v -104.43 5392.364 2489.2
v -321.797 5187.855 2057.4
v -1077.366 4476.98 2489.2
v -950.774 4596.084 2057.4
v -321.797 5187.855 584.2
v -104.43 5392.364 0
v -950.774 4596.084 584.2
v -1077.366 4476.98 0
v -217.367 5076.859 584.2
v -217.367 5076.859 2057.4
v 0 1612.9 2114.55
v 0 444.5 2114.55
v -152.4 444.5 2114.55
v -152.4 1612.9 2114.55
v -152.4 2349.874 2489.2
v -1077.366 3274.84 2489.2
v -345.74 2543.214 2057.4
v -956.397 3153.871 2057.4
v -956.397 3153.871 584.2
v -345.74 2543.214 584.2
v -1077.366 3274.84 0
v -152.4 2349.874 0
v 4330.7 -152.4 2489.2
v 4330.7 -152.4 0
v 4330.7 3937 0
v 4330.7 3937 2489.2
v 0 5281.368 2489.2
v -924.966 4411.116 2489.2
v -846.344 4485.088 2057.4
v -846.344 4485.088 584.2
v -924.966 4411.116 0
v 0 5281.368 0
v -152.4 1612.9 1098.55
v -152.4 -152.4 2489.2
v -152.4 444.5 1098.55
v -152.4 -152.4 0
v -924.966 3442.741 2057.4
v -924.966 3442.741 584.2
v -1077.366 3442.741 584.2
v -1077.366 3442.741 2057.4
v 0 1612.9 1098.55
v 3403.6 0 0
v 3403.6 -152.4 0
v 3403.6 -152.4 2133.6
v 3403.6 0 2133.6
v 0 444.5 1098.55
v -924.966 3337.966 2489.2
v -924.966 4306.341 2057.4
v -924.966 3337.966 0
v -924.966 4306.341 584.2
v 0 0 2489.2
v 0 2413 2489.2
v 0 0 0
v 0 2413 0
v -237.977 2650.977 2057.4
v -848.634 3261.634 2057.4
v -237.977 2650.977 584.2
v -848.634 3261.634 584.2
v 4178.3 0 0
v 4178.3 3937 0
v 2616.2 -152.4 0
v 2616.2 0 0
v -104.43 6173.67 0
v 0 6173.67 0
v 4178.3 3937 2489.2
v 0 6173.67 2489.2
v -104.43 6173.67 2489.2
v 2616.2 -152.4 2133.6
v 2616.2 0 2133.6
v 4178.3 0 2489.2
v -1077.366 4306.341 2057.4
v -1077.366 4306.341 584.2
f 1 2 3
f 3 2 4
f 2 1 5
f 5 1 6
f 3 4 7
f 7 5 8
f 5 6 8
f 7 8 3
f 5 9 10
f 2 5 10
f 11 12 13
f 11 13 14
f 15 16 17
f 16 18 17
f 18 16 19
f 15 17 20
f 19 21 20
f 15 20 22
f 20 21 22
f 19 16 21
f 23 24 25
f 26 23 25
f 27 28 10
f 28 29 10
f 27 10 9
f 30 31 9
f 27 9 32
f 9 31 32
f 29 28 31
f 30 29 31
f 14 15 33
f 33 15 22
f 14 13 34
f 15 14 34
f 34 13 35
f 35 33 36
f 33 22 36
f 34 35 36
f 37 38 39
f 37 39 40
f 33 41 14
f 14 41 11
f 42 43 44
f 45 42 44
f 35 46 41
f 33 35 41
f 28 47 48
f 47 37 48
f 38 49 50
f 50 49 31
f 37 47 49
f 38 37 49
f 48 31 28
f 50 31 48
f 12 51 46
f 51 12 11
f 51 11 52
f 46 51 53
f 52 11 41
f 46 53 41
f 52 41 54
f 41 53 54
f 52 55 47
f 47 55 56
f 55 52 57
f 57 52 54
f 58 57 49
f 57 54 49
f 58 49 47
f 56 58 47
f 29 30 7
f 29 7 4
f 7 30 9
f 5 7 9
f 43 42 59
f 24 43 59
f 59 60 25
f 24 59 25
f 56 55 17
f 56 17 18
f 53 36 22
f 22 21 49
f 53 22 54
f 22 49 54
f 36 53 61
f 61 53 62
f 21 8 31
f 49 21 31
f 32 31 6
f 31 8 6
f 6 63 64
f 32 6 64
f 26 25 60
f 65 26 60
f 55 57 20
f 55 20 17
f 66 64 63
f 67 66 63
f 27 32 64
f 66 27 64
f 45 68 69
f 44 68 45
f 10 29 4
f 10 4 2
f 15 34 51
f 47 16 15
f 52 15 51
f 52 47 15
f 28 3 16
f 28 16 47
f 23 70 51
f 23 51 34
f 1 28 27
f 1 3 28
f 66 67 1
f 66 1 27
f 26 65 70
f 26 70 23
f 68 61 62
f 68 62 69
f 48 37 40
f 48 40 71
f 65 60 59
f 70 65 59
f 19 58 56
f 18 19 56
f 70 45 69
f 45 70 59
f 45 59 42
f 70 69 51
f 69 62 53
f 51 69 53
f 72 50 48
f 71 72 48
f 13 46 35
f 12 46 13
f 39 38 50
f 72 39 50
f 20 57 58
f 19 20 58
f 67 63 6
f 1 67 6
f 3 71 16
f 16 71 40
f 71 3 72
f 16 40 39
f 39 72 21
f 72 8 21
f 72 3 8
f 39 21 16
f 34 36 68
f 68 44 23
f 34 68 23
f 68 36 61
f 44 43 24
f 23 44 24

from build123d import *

# Parameters (mm, degrees)
F1_DEPTH  = 2489.2
F2_W      = 787.4
F2_H      = 2133.6
F3_DEPTH  = 177.8
F4_W      = 1168.4
F4_H      = 1016
F5_DEPTH  = 177.8
F6_W      = 863.6
F6_H      = 1473.2
F7_DEPTH  = 177.8
F8_W      = 863.6
F8_H      = 1473.2
F9_DEPTH  = 177.8
F10_W     = 863.6
F10_H     = 1473.2
F11_DEPTH = 177.8


with BuildPart() as f1:
    # F0 (on Top) → F1 (new body)
    with BuildSketch(Plane.XY):
        Polygon((4178.3, 0), (0, 0), (0, 2413), (-924.9664, 3337.966361), (-924.9664, 4411.116361), (0, 5281.367565), (0, 6173.669815), (-104.430145, 6173.669815), (-104.430145, 5392.363533), (-1077.3664, 4476.980068), (-1077.3664, 3274.840212), (-152.4, 2349.873851), (-152.4, -152.4), (4330.7, -152.4), (4330.7, 3937), (4178.3, 3937), align=None)
    extrude(amount=F1_DEPTH)

    # F2 (on face) → F3 (cut)
    with BuildSketch(Plane.XZ.offset(152.4)):
        with Locations((3009.9, 1066.8)):
            Rectangle(F2_W, F2_H)
    extrude(amount=-F3_DEPTH, mode=Mode.SUBTRACT)

    # F4 (on face) → F5 (cut)
    with BuildSketch(Plane.YZ):
        with Locations((1028.7, 1606.55)):
            Rectangle(F4_W, F4_H)
    extrude(amount=-F5_DEPTH, mode=Mode.SUBTRACT)

    # F6 (on face) → F7 (cut)
    with BuildSketch(Plane.YZ.offset(-924.9664)):
        with Locations((3874.541361, 1320.8)):
            Rectangle(F6_W, F6_H)
    extrude(amount=-F7_DEPTH, mode=Mode.SUBTRACT)

    # F8 (on face) → F9 (cut)
    with BuildSketch(Plane(origin=(-2635.782329, 2801.501543, 0), x_dir=(0.72832, 0.685237, 0), z_dir=(0.685237, -0.72832, 0))):
        with Locations((2888.739358, 1320.8)):
            Rectangle(F8_W, F8_H)
    extrude(amount=-F9_DEPTH, mode=Mode.SUBTRACT)

    # F10 (on face) → F11 (cut)
    with BuildSketch(Plane(origin=(1206.5, 1206.500051, 0), x_dir=(-0.707107, 0.707107, 0), z_dir=(0.707107, 0.707107, 0))):
        with Locations((2474.598627, 1320.8)):
            Rectangle(F10_W, F10_H)
    extrude(amount=-F11_DEPTH, mode=Mode.SUBTRACT)


solid = f1.part
